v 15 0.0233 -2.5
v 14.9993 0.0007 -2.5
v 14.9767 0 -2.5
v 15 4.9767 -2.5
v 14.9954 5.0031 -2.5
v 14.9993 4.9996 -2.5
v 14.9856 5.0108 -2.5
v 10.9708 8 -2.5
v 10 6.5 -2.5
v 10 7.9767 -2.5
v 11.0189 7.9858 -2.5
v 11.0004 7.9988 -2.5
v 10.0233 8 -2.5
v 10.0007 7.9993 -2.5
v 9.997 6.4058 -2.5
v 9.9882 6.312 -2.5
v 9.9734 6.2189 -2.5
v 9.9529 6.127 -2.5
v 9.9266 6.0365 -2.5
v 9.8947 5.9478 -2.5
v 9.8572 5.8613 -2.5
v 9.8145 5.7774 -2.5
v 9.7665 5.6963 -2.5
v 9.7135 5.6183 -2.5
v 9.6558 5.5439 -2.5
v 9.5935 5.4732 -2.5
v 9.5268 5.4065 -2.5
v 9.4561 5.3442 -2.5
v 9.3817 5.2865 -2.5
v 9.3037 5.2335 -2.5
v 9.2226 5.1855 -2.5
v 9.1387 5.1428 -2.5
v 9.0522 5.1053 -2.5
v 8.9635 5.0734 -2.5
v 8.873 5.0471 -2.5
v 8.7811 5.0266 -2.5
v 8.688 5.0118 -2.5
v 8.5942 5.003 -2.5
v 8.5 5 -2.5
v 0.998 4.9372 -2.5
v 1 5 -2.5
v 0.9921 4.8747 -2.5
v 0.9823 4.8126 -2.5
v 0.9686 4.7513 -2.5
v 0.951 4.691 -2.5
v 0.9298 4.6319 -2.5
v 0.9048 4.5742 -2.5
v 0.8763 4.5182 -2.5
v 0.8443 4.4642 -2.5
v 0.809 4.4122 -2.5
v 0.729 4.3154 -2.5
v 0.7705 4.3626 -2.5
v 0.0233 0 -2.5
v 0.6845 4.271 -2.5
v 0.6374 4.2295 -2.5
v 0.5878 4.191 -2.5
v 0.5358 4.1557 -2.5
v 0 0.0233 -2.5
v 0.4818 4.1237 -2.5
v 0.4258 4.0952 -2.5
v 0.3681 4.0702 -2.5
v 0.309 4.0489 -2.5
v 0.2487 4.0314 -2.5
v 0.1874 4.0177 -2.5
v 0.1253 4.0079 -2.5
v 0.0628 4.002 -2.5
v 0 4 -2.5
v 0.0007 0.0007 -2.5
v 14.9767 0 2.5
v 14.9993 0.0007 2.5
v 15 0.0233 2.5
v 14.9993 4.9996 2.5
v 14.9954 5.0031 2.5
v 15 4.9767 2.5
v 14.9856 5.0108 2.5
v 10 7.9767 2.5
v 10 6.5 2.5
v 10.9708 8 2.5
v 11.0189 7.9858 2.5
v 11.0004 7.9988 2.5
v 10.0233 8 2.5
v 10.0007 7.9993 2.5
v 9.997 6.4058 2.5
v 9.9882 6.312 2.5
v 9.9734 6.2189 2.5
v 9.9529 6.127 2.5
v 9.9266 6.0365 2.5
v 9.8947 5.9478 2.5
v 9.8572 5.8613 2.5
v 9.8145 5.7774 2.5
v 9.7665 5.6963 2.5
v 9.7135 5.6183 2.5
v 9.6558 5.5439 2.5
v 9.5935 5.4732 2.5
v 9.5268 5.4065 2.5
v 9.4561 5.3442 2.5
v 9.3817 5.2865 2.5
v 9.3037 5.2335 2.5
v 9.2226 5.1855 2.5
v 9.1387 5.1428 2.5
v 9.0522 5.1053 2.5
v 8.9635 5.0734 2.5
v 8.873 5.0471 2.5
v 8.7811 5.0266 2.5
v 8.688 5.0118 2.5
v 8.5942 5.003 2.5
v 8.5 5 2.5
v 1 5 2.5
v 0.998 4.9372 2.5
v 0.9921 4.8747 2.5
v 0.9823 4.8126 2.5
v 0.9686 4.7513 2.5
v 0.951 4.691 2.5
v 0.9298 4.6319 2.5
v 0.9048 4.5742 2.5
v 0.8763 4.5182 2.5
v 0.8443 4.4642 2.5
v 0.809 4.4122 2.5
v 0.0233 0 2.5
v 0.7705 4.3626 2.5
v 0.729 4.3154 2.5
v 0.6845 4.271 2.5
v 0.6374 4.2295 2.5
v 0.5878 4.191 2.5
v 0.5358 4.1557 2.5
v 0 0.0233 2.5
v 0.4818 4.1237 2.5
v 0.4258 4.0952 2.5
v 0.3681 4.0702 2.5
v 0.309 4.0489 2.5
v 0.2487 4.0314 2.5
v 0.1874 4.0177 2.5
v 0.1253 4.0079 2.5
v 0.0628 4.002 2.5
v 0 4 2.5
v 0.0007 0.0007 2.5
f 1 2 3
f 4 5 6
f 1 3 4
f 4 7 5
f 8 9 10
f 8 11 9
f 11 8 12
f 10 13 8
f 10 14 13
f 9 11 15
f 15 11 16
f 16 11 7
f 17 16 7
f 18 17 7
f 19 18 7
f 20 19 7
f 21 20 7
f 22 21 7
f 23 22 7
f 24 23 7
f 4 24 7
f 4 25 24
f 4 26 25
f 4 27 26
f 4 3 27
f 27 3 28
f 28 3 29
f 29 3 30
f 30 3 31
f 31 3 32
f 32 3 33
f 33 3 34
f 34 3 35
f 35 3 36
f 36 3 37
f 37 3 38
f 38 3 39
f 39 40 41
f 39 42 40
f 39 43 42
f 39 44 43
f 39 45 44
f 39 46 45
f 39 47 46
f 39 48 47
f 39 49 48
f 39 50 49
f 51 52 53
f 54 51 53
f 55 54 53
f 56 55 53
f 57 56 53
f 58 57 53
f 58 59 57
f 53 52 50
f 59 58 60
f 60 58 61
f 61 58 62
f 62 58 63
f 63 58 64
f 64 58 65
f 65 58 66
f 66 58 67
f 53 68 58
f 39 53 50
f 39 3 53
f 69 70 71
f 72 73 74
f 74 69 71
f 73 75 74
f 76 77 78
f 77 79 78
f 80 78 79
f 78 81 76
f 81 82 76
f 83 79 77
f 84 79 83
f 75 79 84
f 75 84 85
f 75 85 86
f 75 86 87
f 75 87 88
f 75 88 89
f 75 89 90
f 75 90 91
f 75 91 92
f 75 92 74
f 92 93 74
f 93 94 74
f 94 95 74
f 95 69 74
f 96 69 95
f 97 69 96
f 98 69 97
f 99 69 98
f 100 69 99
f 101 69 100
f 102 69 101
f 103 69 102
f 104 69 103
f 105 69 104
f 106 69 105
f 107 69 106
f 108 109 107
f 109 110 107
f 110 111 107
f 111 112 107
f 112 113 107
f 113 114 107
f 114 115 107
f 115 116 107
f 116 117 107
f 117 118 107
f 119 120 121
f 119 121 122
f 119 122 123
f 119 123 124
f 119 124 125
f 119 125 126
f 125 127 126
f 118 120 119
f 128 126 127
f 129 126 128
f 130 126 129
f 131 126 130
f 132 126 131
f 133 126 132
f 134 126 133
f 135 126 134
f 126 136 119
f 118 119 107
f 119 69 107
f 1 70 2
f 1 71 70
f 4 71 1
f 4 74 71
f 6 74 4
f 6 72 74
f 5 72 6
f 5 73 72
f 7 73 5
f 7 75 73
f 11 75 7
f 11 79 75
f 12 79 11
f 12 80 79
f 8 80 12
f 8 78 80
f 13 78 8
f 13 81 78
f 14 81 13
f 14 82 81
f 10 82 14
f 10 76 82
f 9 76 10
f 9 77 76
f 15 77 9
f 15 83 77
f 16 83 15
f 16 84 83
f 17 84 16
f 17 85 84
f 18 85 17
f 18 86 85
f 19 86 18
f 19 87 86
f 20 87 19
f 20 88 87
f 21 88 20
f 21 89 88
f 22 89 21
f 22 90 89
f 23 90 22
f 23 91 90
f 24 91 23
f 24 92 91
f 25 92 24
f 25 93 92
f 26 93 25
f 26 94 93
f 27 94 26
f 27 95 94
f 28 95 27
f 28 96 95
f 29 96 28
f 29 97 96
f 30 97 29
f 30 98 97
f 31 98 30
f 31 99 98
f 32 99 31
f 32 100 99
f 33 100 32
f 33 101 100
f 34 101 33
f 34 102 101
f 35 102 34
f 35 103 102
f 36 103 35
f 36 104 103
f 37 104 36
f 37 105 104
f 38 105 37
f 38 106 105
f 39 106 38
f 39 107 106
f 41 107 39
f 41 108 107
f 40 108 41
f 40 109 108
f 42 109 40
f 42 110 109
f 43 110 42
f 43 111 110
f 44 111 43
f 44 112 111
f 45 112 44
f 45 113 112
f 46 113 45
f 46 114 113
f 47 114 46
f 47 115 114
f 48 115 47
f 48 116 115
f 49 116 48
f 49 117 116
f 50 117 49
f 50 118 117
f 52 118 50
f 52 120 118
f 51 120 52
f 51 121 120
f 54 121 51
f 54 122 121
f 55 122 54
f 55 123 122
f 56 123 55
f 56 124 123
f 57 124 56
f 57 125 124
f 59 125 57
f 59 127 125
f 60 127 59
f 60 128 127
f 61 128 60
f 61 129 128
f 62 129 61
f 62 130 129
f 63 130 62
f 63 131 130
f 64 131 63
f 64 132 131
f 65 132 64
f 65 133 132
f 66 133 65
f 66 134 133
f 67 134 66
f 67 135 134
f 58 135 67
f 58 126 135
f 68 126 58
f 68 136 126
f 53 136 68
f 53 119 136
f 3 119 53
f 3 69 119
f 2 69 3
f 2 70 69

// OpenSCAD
module snap_hook(length, width, thickness, hook_depth, hook_length, fillet_r, base_hole_r)
{
    assert(length>0 && width>0 && thickness>0 && hook_depth>0 && hook_length>0 && fillet_r>0 && base_hole_r>0, "Negative Input");
    assert(hook_length<length, "hook length must be shorter than the whole length");
    assert(base_hole_r<thickness && base_hole_r<length, "base hole must be smaller than thickness and length"); // if it was greater than or equal to thickness we remove the base or the length
    

    _points=[
        [0,0],
        [length,0],
        [length,thickness],
        [length - (hook_length * 4/5), thickness + hook_depth],
        [length - (hook_length), thickness + hook_depth],
        [length - hook_length, thickness], 
        [0,thickness]
    ];
    linear_extrude(height=width, center=true, convexity=10)
    {
        difference()
        {
            offset(r=-fillet_r, $fn = 100) offset(r=fillet_r, $fn = 100) polygon(points=_points);
            translate([0,thickness]) circle(r=base_hole_r, $fn = 100);
        }   
    }
}

snap_hook(15,5,5,3,5,1.5,1);
